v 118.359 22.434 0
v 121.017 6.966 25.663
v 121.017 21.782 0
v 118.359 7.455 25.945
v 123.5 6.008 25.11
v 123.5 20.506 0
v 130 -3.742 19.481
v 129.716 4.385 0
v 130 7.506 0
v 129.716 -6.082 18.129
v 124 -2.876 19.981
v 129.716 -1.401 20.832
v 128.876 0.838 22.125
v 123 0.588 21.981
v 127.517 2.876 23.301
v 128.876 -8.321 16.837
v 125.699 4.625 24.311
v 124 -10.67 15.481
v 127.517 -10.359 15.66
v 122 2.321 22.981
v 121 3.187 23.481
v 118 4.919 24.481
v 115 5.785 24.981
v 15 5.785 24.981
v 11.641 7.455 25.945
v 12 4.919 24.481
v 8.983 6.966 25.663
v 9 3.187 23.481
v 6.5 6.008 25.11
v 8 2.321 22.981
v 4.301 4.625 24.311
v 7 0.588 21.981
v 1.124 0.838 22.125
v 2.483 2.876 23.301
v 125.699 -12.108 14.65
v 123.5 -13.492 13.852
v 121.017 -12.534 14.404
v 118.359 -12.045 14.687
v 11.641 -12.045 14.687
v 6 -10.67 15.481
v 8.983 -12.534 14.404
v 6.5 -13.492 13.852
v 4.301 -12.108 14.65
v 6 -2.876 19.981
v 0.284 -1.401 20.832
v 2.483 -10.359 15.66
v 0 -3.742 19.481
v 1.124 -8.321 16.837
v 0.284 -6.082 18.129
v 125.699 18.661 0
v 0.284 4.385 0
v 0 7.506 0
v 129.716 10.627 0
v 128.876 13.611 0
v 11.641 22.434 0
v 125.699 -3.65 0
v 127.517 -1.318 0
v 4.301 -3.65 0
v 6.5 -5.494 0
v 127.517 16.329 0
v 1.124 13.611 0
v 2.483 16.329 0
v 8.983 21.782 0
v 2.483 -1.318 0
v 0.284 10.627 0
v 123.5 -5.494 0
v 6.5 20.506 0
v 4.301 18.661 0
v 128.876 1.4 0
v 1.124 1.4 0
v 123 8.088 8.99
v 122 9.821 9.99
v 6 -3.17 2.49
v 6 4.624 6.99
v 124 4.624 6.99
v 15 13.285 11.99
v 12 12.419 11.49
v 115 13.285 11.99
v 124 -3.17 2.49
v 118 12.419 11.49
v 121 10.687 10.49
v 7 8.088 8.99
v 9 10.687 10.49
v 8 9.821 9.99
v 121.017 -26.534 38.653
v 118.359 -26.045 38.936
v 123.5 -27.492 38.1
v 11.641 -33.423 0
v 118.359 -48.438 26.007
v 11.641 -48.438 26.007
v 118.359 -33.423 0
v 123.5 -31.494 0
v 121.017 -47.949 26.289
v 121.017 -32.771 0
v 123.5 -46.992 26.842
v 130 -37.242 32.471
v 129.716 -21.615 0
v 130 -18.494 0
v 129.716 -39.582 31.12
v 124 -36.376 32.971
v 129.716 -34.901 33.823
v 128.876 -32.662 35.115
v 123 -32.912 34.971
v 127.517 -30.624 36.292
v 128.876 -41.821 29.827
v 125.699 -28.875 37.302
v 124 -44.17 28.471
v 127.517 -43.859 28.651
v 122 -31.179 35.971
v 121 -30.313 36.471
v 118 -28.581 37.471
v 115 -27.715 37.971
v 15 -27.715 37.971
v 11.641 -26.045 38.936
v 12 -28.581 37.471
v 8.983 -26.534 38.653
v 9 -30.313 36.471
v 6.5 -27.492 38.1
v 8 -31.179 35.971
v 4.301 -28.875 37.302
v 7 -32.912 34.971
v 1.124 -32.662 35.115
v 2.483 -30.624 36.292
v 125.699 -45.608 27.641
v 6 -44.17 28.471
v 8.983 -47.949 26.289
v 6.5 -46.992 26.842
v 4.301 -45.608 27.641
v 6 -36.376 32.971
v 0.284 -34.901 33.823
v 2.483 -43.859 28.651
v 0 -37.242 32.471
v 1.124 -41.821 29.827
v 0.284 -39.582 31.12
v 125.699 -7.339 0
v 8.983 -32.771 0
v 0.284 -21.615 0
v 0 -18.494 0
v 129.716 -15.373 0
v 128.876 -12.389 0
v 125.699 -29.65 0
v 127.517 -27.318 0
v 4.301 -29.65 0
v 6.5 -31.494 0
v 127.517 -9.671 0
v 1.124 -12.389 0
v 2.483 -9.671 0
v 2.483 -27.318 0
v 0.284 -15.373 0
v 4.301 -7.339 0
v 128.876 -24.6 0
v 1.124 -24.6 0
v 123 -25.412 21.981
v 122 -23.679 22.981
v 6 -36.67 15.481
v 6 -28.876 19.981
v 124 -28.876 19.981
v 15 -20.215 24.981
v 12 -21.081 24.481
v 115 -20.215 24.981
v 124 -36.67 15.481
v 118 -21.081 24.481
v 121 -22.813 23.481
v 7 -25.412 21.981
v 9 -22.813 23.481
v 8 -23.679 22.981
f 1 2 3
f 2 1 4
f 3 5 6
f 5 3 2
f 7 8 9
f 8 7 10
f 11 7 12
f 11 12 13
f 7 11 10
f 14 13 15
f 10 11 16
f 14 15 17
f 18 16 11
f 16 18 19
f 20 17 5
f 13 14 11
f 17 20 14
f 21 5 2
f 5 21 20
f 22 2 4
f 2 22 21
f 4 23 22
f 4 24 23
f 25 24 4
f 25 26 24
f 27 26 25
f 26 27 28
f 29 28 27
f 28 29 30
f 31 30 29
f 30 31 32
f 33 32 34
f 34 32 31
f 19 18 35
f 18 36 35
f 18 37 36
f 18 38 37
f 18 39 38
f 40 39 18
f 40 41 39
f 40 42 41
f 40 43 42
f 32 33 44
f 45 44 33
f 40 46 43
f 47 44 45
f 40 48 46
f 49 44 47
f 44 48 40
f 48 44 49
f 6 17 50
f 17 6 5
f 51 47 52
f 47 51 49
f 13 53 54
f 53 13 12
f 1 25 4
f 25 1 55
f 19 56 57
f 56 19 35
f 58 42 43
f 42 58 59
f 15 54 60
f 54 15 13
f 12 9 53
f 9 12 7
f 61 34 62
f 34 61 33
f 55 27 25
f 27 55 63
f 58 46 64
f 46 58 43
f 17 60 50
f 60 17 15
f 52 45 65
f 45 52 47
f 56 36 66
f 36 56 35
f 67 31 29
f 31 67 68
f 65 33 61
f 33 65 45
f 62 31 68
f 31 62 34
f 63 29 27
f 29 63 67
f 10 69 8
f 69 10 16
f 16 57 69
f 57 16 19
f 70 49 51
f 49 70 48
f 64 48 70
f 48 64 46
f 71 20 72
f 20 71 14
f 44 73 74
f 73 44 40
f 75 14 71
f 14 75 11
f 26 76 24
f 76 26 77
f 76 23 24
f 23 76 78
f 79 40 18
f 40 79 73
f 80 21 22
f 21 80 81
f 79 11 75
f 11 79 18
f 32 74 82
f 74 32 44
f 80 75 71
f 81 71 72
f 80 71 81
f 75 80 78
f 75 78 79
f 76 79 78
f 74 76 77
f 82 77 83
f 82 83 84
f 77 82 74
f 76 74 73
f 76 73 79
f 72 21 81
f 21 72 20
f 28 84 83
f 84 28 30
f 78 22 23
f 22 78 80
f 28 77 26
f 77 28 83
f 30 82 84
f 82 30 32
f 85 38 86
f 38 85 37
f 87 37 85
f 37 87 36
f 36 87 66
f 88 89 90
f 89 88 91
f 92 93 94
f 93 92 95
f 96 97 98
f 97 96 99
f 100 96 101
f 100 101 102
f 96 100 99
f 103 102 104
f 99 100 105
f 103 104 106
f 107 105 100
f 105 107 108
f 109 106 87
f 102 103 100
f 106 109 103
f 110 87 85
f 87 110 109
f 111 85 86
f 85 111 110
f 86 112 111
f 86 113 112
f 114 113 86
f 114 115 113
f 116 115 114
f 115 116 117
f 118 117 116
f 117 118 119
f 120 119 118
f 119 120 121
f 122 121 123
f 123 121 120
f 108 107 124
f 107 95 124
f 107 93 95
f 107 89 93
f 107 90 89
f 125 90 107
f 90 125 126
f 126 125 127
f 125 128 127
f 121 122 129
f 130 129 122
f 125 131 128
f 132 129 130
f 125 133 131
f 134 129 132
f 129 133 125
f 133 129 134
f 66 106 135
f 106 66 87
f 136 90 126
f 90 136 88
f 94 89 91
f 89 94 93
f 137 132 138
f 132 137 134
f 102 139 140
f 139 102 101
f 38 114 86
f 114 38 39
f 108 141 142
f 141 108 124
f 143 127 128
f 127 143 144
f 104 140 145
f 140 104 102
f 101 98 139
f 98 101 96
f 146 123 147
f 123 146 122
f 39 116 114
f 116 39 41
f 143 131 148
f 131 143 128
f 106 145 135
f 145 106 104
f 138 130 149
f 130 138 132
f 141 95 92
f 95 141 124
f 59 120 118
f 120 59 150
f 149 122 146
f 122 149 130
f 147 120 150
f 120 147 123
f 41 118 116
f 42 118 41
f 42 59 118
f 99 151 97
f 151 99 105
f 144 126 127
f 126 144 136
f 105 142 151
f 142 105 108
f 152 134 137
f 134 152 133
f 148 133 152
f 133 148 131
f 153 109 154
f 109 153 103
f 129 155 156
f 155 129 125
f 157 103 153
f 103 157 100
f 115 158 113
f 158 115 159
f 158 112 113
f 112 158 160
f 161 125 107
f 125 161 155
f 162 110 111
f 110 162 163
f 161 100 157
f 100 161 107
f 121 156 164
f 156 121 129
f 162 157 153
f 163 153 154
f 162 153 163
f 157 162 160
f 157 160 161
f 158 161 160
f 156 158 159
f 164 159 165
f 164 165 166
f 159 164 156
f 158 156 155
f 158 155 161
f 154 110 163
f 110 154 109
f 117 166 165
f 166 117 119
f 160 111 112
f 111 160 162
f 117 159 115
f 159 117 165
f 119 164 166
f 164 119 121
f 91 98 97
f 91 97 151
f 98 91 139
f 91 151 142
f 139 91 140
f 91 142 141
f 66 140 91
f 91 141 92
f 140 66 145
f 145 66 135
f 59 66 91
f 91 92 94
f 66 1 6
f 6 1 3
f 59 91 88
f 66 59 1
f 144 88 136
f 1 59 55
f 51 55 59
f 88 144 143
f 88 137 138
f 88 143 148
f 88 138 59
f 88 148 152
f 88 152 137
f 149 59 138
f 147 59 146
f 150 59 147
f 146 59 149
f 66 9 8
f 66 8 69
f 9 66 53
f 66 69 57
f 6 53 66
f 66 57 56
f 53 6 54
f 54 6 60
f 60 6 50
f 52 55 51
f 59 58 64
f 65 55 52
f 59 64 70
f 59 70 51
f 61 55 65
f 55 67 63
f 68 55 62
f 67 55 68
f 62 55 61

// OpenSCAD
//Amount of cart slots
cart_count = 2; //[1:1:8]
//Cart type
cart_type = 2; //[0:Snes PAL, 1:Snes NTSC, 2:N64, 3:Gameboy/GBA, 4:DS/3DS]


module cart_cup(cup_height, cup_width, cup_depth, cart_hole_depth) {
    
    difference() {
        translate([0,cup_depth/2,0])
        union() {
            hull() {
                translate([cup_depth/2,0,0])
                cylinder(h=cup_height, d=cup_depth);
                
                translate([cup_width-cup_depth/2,0,0])
                cylinder(h=cup_height, d=cup_depth);
            }
        }
        translate([cup_width/2,0,cup_height-cart_hole_depth])
        children();
    }
}
    
module snescart_pal() {
    translate([-130/2,5,0])
    linear_extrude(88)
    polygon([[0,0],[130,0],
            [130,10],[127,16],[120,18],[100,20],[70,22],
            [60,22],[30,20],[10,18],[3,16],[0,10]]);
    
};


module snescart_ntsc() {
    translate([-130/2,5,0])
    linear_extrude(88)
    polygon([
        [-4,0],[-4,19],[17,19],[17,22],
        [113,22],[113,19],[134,19],[134,0]    
    ]);
    
};

module gameboycart() {
    translate([-58/2,3,0])
    linear_extrude(65)
    polygon([[0,0],[58,0],
            [58,8],[0,8]]);
    
};

module dscart() {
    translate([-34/2,3,0])
    linear_extrude(35)
    polygon([[0,0],[34,0],
            [34,4.5],[0,4.5]]);
    
};

module n64cart() {
    translate([-118/2,5,0])
    linear_extrude(76)
    polygon([[0,0],[0,9],[1,13],[2,15],[3,16],[6,18],[9,19],
            [118-9,19],[118-6,18],[118-3,16],[118-2,15],[118-1,13],[118,9],[118,0]]);
    
};

module cart_stand(  amount_of_carts, delta_y, delta_h, angle,
                    cup_height, cup_width, cup_depth, cart_hole_depth) {

    cut_from_bottom = sin(angle)*cup_depth;
                        
    difference() {
        union() {
            for(i = [0:amount_of_carts-1]) {
                translate([0, -i*delta_y, -cut_from_bottom])
                rotate([angle, 0, 0])
                cart_cup(   cup_height + i*delta_h, cup_width, cup_depth,  
                            cart_hole_depth) 
                #children();
            }
        }
        //ground
        translate([0, -delta_y*amount_of_carts, -cut_from_bottom])
        cube([cup_width, delta_y*(amount_of_carts+1), cut_from_bottom]);
    }
}

//cart_stand(  amount_of_carts, delta_y, delta_h, angle,
//             cup_height, cup_width, cup_depth, cart_hole_depth)

//cart_type: [0:Snes PAL, 1:Snes NTSC, 2:N64, 3:Gameboy/GBA, 4:DS/3DS]

if (cart_type == 0) {
    cart_stand(cart_count, 30, 15, 30, 30, 150, 30, 15) snescart_pal();
}
if (cart_type == 1) {
    cart_stand(cart_count, 30, 15, 30, 30, 150, 30, 15) snescart_ntsc();
}
if (cart_type == 2) {
    cart_stand(cart_count, 26, 15, 30, 30, 130, 26, 15) n64cart();
}
if (cart_type == 3) {
    cart_stand(cart_count, 14, 8, 30, 15, 68, 14, 6) gameboycart();
}
if (cart_type == 4) {
    cart_stand(cart_count, 9, 5, 30, 12, 40, 10, 6) dscart();
}
